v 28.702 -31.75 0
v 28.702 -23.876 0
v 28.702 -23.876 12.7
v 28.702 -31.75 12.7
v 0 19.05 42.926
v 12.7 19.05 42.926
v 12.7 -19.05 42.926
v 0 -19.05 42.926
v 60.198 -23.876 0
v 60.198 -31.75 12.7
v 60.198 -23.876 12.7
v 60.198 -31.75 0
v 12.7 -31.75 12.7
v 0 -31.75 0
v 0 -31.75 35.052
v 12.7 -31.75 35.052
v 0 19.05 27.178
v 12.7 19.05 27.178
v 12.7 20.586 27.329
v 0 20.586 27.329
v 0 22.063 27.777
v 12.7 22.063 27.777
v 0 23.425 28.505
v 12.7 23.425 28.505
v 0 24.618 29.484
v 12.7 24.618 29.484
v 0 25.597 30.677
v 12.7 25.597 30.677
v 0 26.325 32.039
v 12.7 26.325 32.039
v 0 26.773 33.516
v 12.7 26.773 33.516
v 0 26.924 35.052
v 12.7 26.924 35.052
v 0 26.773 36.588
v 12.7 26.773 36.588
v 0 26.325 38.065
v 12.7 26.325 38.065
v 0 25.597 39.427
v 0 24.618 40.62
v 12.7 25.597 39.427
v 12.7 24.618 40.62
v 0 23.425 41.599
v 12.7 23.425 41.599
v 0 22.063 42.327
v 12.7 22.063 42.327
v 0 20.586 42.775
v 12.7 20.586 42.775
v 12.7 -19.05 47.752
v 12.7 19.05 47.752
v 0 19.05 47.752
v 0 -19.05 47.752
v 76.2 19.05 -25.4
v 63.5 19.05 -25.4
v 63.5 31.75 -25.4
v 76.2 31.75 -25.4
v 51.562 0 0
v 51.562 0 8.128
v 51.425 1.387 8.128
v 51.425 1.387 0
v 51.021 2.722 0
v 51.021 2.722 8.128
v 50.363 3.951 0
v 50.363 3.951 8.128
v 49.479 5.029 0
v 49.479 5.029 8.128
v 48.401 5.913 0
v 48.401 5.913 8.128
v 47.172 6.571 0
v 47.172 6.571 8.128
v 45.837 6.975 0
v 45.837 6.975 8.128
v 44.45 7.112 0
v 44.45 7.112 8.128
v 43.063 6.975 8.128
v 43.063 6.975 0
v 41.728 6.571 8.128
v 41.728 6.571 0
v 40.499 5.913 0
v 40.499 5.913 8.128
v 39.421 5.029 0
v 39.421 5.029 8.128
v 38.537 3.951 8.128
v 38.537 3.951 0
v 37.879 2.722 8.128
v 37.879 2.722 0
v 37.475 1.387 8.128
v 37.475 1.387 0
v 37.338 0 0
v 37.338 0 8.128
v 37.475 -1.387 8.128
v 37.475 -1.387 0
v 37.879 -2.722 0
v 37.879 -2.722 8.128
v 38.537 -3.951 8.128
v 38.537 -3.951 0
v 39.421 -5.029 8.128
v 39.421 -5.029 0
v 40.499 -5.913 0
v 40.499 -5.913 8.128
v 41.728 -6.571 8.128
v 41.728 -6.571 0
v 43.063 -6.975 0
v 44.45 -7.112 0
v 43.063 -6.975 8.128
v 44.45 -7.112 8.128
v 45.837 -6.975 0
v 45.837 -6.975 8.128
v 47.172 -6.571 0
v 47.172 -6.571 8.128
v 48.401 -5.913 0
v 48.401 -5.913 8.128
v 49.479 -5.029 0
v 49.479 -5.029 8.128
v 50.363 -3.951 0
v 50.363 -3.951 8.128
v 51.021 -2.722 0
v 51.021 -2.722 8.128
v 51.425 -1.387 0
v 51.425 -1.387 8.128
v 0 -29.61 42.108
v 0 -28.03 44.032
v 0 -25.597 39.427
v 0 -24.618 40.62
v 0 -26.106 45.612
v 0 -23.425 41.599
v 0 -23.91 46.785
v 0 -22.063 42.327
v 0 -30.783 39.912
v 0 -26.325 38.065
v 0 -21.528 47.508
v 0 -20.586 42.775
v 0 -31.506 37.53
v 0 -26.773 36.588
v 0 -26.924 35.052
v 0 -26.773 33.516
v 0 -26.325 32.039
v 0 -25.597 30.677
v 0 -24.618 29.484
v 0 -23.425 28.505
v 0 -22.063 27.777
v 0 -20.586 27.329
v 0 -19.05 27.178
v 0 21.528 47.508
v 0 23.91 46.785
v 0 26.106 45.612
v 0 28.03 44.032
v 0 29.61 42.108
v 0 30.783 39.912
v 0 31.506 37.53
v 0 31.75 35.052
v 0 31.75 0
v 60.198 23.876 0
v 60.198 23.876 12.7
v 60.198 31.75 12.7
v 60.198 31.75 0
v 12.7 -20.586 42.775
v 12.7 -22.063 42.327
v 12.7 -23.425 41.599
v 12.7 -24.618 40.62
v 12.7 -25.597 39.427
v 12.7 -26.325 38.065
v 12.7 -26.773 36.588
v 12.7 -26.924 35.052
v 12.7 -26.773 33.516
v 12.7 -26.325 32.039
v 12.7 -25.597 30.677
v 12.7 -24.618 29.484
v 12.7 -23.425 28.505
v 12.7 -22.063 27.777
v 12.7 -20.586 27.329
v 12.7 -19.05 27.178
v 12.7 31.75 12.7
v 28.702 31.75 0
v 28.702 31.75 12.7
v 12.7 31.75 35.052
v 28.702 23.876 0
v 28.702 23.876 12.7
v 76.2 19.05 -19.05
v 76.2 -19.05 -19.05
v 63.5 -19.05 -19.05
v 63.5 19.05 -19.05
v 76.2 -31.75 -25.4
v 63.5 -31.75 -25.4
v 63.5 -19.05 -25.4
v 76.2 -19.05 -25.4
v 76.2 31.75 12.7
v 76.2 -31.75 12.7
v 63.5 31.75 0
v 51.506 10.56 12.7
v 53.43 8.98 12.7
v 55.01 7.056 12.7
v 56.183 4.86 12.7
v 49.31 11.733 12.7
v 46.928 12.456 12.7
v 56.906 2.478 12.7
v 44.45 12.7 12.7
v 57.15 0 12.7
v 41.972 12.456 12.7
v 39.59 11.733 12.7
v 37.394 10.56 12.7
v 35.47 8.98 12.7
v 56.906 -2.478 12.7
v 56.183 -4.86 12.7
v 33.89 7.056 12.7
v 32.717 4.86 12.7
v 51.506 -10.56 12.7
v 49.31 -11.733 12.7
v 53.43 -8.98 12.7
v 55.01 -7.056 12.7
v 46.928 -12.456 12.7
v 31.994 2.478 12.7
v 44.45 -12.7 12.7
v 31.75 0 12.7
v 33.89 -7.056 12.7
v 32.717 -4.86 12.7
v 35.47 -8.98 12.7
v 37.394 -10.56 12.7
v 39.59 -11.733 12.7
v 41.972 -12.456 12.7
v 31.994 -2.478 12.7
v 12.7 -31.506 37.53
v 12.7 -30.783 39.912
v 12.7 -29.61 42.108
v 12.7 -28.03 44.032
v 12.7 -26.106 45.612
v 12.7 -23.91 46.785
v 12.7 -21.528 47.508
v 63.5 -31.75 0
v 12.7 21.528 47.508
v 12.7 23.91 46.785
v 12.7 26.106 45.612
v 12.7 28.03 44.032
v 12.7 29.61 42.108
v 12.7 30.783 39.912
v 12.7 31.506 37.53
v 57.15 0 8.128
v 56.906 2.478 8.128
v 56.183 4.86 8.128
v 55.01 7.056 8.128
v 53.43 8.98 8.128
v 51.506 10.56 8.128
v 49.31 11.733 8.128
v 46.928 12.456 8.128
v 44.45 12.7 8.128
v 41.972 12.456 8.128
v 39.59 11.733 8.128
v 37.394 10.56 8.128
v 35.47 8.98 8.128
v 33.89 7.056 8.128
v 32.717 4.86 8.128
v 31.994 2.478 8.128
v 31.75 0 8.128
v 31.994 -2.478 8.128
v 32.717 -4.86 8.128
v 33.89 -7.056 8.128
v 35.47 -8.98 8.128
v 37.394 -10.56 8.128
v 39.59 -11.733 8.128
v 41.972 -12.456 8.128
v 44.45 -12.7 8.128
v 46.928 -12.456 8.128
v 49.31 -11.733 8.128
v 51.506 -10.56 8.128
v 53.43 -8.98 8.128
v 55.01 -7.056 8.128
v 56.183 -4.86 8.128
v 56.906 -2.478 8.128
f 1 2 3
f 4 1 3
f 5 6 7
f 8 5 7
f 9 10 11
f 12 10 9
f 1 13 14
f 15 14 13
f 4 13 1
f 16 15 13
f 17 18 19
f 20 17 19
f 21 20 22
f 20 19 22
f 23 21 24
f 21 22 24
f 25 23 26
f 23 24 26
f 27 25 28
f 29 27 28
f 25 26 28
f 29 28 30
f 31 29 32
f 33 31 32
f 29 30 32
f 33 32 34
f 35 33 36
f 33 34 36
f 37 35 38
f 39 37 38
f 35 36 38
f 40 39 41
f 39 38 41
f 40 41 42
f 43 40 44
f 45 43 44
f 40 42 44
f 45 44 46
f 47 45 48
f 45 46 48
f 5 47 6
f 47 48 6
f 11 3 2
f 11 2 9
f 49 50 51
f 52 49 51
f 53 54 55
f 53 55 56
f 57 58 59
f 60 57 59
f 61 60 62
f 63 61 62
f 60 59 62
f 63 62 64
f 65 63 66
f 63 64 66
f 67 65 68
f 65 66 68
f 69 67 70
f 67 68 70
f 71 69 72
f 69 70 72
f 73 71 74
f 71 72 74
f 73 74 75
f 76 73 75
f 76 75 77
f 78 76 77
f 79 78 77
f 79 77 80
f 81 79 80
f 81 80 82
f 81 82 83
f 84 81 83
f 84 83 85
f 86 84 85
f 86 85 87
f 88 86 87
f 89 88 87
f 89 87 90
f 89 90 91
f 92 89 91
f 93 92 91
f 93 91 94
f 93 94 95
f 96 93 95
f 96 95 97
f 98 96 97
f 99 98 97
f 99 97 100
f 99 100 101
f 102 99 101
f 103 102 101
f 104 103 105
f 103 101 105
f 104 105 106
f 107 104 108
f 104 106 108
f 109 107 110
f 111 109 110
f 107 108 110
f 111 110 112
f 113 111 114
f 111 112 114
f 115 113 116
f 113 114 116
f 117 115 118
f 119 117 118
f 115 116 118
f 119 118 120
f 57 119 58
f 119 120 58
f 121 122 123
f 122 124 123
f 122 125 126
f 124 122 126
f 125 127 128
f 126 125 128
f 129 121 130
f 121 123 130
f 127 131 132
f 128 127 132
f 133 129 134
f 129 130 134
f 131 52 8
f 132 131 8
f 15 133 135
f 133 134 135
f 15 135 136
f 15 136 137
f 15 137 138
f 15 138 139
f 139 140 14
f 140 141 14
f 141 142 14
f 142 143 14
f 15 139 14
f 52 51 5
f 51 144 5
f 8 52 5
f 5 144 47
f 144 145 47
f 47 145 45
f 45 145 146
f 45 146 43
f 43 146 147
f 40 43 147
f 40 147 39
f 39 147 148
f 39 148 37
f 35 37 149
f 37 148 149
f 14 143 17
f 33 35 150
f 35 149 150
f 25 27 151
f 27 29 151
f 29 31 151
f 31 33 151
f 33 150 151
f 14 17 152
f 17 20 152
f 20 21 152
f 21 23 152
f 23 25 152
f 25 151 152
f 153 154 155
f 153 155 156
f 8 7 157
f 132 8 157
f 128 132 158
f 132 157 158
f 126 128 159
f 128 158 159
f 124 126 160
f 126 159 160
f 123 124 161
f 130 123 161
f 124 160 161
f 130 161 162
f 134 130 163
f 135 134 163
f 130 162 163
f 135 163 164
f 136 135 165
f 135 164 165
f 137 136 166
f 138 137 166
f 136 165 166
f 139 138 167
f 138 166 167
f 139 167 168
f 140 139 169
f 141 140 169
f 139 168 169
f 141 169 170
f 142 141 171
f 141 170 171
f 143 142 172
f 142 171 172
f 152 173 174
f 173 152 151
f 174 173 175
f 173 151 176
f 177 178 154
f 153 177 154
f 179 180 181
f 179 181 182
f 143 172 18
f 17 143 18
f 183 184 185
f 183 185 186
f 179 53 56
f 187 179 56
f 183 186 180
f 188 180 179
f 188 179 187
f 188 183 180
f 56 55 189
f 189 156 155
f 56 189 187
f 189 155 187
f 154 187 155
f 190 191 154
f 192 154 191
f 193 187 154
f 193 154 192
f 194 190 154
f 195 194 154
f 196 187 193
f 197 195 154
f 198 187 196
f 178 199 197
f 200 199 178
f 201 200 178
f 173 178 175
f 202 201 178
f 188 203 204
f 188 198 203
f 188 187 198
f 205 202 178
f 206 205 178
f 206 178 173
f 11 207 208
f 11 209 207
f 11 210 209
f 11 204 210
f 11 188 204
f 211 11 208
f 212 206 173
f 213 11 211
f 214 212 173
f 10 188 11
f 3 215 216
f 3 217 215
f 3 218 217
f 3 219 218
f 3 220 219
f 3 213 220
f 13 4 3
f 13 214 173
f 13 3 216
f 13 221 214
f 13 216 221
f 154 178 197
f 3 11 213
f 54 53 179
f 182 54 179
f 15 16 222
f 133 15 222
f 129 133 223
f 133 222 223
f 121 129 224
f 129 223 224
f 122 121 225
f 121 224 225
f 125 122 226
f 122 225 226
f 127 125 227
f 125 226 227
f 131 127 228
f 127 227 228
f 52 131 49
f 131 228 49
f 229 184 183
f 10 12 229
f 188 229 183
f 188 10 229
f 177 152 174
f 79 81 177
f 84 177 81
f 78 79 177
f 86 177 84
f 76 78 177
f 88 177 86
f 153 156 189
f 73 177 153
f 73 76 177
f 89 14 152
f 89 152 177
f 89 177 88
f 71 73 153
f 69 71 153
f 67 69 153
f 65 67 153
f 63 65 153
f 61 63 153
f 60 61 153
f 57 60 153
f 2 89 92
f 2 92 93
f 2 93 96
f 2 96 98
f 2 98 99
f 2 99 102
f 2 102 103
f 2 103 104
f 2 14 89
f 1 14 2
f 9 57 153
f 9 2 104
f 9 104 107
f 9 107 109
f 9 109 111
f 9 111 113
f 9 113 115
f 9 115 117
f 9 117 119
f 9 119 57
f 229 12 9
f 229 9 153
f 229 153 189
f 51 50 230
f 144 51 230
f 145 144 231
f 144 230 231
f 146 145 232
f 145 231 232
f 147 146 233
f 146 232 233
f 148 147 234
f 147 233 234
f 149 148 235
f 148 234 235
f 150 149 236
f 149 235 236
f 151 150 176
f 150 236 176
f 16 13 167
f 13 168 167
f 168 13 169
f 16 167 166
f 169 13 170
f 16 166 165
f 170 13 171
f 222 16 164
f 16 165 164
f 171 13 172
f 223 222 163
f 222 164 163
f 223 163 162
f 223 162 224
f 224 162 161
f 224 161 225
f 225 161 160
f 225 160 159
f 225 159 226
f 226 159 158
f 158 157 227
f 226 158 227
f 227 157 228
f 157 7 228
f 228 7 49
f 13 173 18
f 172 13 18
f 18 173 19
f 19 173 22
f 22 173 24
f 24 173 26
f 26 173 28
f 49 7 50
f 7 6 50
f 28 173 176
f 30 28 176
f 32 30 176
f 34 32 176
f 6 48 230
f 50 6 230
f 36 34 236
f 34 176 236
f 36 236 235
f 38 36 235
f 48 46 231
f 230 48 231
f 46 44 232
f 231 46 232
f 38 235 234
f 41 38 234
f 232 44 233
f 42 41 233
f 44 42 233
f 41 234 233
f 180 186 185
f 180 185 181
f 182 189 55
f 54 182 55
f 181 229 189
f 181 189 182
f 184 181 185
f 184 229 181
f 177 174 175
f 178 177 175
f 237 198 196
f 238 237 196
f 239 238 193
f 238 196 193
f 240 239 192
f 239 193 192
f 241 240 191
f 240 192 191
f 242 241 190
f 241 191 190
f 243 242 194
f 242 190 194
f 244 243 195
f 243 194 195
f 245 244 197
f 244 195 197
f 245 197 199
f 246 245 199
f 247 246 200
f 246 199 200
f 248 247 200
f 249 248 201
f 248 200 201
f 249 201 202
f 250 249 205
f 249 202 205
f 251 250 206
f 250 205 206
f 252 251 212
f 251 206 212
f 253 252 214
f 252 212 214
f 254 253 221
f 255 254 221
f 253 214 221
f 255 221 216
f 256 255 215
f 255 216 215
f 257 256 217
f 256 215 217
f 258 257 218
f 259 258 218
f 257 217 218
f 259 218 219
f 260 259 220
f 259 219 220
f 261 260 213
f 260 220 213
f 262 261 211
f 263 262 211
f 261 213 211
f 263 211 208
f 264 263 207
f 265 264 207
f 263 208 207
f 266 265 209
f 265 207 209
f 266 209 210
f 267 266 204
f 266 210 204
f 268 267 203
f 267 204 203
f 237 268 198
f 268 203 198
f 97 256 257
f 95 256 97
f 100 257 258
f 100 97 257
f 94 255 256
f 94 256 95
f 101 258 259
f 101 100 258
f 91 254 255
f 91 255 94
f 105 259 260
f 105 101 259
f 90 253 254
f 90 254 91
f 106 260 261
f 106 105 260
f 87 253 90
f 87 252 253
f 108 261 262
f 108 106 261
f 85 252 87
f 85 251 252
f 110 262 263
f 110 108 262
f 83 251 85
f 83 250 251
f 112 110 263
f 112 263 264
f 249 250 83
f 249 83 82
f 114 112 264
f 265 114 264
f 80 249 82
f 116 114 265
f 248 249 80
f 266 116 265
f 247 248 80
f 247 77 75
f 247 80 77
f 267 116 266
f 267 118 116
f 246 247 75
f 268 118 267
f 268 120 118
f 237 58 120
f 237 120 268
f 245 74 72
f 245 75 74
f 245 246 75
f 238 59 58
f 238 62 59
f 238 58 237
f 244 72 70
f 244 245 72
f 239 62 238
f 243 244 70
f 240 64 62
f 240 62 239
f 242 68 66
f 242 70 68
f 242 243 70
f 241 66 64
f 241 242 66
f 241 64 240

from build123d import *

# Parameters (mm, degrees)
F0_W     = 31.496
F0_H     = 12.7
F1_DEPTH = 23.876
F2_DEPTH = 31.75
F3_W     = 38.1
F3_H     = 6.35
F4_DEPTH = 76.201
F6_DEPTH = 25.4
F7_R     = 7.112
F8_DEPTH = 38.101
F7_R_2   = 12.7
F9_DEPTH = 4.572


with BuildPart() as f1:
    # F0 (on Front) → F1 (new body, symmetric)
    with BuildSketch(Plane.XZ):
        with Locations((44.45, 6.35)):
            Rectangle(F0_W, F0_H)
    extrude(amount=F1_DEPTH, both=True)

    # F0 (on Front) → F2 (join, symmetric)
    with BuildSketch(Plane.XZ):
        Polygon((0, 47.752), (0, 0), (28.702, 0), (28.702, 12.7), (12.7, 12.7), (12.7, 47.752), align=None)
        Polygon((60.198, 12.7), (60.198, 0), (63.5, 0), (63.5, -25.4), (76.2, -25.4), (76.2, 12.7), align=None)
    extrude(amount=F2_DEPTH, both=True)

    # F3 (on face) → F4 (cut, through all)
    with BuildSketch(Plane.YZ.offset(76.2)):
        with Locations((0, -22.225)):
            Rectangle(F3_W, F3_H)
    extrude(amount=-F4_DEPTH, mode=Mode.SUBTRACT)

    # F5 (on face) → F6 (cut)
    with BuildSketch(Plane.YZ.offset(12.7)):
        with BuildLine():
            ThreePointArc((-31.75, 35.052), (-28.030256, 44.032256), (-19.05, 47.752))
            Line((-19.05, 47.752), (-31.75, 47.752))
            Line((-31.75, 47.752), (-31.75, 35.052))
        make_face()
        with BuildLine():
            Line((19.05, 42.926), (-19.05, 42.926))
            ThreePointArc((-19.05, 42.926), (-26.924, 35.052), (-19.05, 27.178))
            Line((-19.05, 27.178), (19.05, 27.178))
            ThreePointArc((19.05, 27.178), (26.924, 35.052), (19.05, 42.926))
        make_face()
        with BuildLine():
            Line((31.75, 47.752), (19.05, 47.752))
            ThreePointArc((19.05, 47.752), (28.030256, 44.032256), (31.75, 35.052))
            Line((31.75, 35.052), (31.75, 47.752))
        make_face()
    extrude(amount=-F6_DEPTH, mode=Mode.SUBTRACT)

    # F7 (on face) → F8 (cut, through all)
    with BuildSketch(Plane.XY.offset(12.7)):
        with Locations((44.45, 0)):
            Circle(F7_R)
    extrude(amount=-F8_DEPTH, mode=Mode.SUBTRACT)

    # F7 (on face) → F9 (cut)
    with BuildSketch(Plane.XY.offset(12.7)):
        with Locations((44.45, 0)):
            Circle(F7_R_2)
        with Locations((44.45, 0)):
            Circle(F7_R, mode=Mode.SUBTRACT)
    extrude(amount=-F9_DEPTH, mode=Mode.SUBTRACT)


solid = f1.part
